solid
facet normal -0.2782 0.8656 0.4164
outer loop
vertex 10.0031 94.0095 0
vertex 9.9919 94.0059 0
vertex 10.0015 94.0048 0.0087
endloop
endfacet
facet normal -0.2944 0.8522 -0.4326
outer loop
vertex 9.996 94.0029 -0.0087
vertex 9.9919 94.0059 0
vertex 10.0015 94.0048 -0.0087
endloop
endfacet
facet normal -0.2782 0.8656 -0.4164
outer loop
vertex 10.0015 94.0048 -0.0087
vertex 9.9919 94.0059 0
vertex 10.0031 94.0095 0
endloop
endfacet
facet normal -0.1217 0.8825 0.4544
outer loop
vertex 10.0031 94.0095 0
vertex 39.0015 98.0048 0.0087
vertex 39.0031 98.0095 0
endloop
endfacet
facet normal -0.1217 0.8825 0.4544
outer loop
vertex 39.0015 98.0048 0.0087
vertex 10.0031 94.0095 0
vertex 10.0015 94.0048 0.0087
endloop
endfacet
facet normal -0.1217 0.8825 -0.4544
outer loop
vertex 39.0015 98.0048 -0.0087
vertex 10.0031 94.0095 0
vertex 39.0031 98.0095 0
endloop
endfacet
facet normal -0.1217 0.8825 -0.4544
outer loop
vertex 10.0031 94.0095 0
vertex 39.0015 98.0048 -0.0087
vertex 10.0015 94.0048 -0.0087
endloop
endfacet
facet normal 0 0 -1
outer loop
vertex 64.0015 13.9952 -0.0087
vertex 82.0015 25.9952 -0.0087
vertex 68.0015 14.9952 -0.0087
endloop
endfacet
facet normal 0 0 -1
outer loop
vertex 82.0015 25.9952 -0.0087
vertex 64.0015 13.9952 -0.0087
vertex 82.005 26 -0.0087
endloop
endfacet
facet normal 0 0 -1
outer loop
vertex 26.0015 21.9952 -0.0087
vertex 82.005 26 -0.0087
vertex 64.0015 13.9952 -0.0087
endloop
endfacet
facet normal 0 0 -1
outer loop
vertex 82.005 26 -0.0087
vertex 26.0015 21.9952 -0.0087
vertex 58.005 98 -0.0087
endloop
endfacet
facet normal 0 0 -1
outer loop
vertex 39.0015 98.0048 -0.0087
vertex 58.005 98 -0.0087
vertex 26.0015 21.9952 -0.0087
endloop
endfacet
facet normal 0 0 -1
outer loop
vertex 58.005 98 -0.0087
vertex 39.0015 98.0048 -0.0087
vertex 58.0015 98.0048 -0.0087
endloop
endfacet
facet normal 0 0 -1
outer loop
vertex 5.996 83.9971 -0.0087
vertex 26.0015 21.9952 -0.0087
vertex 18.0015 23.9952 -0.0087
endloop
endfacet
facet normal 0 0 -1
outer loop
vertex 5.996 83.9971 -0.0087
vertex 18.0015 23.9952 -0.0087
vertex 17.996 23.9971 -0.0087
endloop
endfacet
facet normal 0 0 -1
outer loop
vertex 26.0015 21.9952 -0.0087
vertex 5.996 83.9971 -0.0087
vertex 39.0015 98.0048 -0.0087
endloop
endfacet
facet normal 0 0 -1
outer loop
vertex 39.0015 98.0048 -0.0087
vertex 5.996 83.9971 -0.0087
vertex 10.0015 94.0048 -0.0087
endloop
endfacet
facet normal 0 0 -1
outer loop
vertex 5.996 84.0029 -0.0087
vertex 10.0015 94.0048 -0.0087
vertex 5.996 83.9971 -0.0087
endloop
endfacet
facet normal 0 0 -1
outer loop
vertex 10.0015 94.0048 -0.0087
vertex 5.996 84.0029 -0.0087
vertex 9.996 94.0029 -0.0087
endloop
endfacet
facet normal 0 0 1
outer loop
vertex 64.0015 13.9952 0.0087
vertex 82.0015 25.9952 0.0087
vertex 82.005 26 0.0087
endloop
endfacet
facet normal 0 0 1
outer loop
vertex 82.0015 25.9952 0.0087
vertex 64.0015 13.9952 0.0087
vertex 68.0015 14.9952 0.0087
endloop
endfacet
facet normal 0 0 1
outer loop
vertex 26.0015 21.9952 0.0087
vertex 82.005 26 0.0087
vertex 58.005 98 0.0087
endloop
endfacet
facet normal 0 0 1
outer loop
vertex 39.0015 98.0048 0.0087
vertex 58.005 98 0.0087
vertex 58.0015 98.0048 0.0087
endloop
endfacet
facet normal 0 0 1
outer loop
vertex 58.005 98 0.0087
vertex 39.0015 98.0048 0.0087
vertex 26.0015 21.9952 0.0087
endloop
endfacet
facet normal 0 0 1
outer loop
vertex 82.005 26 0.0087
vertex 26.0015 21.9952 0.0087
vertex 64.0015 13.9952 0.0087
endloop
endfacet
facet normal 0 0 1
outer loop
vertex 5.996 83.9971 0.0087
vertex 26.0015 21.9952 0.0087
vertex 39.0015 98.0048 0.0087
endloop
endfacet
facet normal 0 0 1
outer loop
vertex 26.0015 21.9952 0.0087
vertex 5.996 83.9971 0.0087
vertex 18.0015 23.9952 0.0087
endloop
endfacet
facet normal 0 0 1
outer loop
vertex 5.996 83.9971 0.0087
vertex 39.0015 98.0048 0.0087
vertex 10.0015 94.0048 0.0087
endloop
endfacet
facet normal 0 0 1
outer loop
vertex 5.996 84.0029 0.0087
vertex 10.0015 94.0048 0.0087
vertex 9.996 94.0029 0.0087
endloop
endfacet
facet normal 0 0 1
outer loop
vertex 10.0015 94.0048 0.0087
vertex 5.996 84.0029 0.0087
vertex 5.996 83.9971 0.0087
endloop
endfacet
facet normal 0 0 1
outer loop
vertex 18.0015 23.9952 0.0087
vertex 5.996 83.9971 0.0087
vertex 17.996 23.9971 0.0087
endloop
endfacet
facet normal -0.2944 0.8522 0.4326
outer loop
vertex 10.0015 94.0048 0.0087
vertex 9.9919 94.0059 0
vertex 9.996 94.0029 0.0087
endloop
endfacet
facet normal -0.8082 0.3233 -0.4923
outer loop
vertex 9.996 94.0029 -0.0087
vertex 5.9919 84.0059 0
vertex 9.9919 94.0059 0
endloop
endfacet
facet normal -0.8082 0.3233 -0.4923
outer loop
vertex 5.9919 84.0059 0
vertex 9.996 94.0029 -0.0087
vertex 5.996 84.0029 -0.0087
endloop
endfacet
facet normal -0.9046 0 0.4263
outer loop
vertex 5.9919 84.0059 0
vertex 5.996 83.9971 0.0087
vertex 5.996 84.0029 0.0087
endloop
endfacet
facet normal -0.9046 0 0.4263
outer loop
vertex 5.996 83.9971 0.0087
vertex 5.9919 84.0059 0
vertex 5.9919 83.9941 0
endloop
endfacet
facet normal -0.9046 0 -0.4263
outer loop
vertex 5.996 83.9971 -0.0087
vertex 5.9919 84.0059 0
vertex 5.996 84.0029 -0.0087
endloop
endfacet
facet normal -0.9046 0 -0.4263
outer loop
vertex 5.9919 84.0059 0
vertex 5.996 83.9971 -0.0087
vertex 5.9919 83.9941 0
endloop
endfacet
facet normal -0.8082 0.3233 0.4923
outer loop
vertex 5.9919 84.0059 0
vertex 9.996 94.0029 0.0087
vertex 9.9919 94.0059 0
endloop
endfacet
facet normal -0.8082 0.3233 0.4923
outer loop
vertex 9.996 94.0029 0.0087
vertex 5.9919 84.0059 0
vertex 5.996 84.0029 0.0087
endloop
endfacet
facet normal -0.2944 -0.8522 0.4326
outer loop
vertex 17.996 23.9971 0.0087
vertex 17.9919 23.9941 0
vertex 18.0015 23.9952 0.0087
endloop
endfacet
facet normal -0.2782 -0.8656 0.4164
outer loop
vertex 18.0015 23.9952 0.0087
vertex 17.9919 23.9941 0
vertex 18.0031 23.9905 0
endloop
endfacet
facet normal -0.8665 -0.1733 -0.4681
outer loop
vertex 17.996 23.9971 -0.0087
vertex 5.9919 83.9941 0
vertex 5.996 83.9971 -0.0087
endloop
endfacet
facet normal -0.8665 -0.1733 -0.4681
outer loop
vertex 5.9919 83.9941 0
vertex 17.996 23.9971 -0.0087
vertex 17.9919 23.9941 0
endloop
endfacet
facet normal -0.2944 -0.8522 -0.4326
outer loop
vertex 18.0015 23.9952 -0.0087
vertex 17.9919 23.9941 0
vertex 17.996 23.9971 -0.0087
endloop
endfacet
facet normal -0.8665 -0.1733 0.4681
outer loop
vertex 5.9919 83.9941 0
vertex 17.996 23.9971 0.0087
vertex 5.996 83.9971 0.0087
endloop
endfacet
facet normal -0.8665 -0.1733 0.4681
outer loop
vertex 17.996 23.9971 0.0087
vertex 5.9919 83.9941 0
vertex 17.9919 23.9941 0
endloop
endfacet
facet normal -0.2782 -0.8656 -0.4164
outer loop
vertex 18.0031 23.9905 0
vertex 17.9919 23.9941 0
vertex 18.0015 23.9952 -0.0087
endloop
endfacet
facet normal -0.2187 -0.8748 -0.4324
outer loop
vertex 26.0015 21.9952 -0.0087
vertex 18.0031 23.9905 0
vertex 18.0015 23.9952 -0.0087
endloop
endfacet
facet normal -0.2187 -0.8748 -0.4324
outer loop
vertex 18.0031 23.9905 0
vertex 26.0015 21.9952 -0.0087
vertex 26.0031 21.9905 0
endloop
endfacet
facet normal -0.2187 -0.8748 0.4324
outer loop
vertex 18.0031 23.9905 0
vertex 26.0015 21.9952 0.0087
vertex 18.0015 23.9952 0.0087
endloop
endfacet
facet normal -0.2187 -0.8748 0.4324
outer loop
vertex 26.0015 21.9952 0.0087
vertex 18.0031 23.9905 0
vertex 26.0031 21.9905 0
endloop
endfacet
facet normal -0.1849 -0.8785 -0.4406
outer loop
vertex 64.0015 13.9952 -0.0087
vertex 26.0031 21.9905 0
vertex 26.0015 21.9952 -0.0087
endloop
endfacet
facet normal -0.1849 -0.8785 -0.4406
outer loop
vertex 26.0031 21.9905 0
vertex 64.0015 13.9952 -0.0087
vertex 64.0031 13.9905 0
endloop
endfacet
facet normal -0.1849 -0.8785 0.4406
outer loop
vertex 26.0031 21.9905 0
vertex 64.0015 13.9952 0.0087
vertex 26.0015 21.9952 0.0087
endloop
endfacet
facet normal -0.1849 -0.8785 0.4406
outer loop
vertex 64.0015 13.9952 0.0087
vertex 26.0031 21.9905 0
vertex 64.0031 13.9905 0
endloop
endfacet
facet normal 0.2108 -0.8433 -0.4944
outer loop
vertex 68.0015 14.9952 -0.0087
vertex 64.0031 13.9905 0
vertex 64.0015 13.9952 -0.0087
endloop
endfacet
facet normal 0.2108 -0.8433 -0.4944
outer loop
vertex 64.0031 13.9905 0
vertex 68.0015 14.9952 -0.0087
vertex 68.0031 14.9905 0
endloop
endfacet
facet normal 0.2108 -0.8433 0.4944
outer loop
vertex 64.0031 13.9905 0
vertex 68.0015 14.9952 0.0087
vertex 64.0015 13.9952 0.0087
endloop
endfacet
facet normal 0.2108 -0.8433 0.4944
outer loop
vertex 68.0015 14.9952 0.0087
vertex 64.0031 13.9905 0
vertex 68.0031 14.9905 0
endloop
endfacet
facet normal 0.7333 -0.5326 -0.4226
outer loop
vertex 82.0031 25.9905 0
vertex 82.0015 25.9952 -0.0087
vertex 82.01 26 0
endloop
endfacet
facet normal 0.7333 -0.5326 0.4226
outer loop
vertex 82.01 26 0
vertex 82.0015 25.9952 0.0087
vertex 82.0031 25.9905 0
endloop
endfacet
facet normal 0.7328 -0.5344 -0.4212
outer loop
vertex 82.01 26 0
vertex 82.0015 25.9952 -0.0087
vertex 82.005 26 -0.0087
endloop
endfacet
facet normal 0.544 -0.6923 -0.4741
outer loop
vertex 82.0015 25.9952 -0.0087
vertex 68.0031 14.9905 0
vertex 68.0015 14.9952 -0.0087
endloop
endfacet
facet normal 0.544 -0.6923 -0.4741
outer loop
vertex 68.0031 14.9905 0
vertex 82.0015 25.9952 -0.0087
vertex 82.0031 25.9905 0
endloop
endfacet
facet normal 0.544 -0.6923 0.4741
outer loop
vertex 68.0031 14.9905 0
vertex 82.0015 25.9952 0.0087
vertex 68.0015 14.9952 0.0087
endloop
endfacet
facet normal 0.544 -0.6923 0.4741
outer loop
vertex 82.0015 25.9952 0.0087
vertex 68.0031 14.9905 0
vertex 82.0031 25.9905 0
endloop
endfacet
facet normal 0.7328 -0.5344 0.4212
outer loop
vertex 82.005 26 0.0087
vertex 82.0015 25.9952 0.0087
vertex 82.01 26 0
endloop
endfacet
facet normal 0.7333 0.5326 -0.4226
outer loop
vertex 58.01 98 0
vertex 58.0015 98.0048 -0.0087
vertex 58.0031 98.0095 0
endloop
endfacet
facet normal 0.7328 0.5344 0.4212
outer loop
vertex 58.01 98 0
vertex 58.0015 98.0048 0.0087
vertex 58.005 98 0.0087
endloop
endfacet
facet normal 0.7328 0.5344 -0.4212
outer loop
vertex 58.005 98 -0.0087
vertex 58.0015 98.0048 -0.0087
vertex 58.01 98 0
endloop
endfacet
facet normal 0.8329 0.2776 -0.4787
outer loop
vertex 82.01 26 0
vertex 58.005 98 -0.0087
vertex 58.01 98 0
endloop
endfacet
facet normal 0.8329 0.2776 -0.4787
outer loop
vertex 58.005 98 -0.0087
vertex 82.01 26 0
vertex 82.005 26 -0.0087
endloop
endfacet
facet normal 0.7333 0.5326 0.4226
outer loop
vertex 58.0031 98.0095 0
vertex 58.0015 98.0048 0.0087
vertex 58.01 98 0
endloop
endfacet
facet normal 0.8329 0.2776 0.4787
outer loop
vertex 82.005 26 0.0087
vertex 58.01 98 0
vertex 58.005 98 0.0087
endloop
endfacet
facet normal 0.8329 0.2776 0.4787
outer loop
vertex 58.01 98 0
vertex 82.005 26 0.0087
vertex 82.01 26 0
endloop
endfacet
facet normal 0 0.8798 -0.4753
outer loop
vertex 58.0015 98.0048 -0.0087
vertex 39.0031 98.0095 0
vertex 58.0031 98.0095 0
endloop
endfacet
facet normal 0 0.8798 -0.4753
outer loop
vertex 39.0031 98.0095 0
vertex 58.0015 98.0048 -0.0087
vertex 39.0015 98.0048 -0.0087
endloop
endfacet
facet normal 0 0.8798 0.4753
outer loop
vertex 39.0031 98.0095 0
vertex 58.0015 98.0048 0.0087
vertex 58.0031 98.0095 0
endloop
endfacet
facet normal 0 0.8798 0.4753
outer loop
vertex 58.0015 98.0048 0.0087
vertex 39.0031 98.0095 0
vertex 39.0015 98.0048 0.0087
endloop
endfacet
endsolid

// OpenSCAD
color([0.3519350680925015,0.6477014615427978,0.14125726454845833]) hull(){
    translate([10,94]) sphere(0.01);
    translate([39,98]) sphere(0.01);
    translate([22,90]) sphere(0.01);
}
color([0.23013900541024712,0.8285218163248013,0.9603761550286747]) hull(){
    translate([10,94]) sphere(0.01);
    translate([22,90]) sphere(0.01);
    translate([6,84]) sphere(0.01);
}
color([0.6050710034948523,0.017553655236826726,0.43262871278032167]) hull(){
    translate([6,84]) sphere(0.01);
    translate([22,90]) sphere(0.01);
    translate([18,58]) sphere(0.01);
}
color([0.2571490251669072,0.4480229944680496,0.14517873337393172]) hull(){
    translate([6,84]) sphere(0.01);
    translate([18,58]) sphere(0.01);
    translate([18,24]) sphere(0.01);
}
color([0.8405131005933094,0.9776834869331054,0.10300019528175153]) hull(){
    translate([18,24]) sphere(0.01);
    translate([18,58]) sphere(0.01);
    translate([26,22]) sphere(0.01);
}
color([0.998153073210626,0.8535026464000083,0.6855970549077809]) hull(){
    translate([26,22]) sphere(0.01);
    translate([18,58]) sphere(0.01);
    translate([44,47]) sphere(0.01);
}
color([0.7995005100691247,0.34047238184459006,0.1286635278612125]) hull(){
    translate([44,47]) sphere(0.01);
    translate([42,29]) sphere(0.01);
    translate([26,22]) sphere(0.01);
}
color([0.6020598448119898,0.9167847797194366,0.02081986636819022]) hull(){
    translate([26,22]) sphere(0.01);
    translate([42,29]) sphere(0.01);
    translate([64,14]) sphere(0.01);
}
color([0.9135118305629362,0.3823609034395232,0.42581309278619206]) hull(){
    translate([64,14]) sphere(0.01);
    translate([42,29]) sphere(0.01);
    translate([58,33]) sphere(0.01);
}
color([0.08967296065919184,0.0016857337534631478,0.31287848776698257]) hull(){
    translate([64,14]) sphere(0.01);
    translate([58,33]) sphere(0.01);
    translate([68,15]) sphere(0.01);
}
color([0.09731792302828757,0.364404074066101,0.8754307508322564]) hull(){
    translate([68,15]) sphere(0.01);
    translate([58,33]) sphere(0.01);
    translate([82,26]) sphere(0.01);
}
color([0.6967090939923642,0.5776053806129825,0.18685318159950626]) hull(){
    translate([44,47]) sphere(0.01);
    translate([58,33]) sphere(0.01);
    translate([42,29]) sphere(0.01);
}
color([0.9585806736472646,0.593334846568766,0.09927504601217696]) hull(){
    translate([44,55]) sphere(0.01);
    translate([44,47]) sphere(0.01);
    translate([58,33]) sphere(0.01);
}
color([0.19313665173925,0.6863688301261038,0.2093263356404984]) hull(){
    translate([44,55]) sphere(0.01);
    translate([58,33]) sphere(0.01);
    translate([82,26]) sphere(0.01);
}
color([0.2694340379225941,0.24598969558588324,0.16092298384524362]) hull(){
    translate([58,98]) sphere(0.01);
    translate([44,55]) sphere(0.01);
    translate([82,26]) sphere(0.01);
}
color([0.5102606956149307,0.431705445139412,0.38909399282504675]) hull(){
    translate([58,98]) sphere(0.01);
    translate([50,93]) sphere(0.01);
    translate([44,55]) sphere(0.01);
}
color([0.3194819673674283,0.6655357355223767,0.22692357675811492]) hull(){
    translate([18,58]) sphere(0.01);
    translate([44,55]) sphere(0.01);
    translate([22,90]) sphere(0.01);
}
color([0.9464906820257937,0.35776616524050997,0.9421064453260054]) hull(){
    translate([18,58]) sphere(0.01);
    translate([44,47]) sphere(0.01);
    translate([44,55]) sphere(0.01);
}
color([0.3792404853118415,0.27508202782836655,0.9368074710650367]) hull(){
    translate([22,90]) sphere(0.01);
    translate([50,93]) sphere(0.01);
    translate([44,55]) sphere(0.01);
}
color([0.7670397757471089,0.17483880300164423,0.7474114244696689]) hull(){
    translate([39,98]) sphere(0.01);
    translate([50,93]) sphere(0.01);
    translate([22,90]) sphere(0.01);
}
color([0.6015236368594579,0.5872808850844162,0.28390336255679416]) hull(){
    translate([39,98]) sphere(0.01);
    translate([58,98]) sphere(0.01);
    translate([50,93]) sphere(0.01);
}
